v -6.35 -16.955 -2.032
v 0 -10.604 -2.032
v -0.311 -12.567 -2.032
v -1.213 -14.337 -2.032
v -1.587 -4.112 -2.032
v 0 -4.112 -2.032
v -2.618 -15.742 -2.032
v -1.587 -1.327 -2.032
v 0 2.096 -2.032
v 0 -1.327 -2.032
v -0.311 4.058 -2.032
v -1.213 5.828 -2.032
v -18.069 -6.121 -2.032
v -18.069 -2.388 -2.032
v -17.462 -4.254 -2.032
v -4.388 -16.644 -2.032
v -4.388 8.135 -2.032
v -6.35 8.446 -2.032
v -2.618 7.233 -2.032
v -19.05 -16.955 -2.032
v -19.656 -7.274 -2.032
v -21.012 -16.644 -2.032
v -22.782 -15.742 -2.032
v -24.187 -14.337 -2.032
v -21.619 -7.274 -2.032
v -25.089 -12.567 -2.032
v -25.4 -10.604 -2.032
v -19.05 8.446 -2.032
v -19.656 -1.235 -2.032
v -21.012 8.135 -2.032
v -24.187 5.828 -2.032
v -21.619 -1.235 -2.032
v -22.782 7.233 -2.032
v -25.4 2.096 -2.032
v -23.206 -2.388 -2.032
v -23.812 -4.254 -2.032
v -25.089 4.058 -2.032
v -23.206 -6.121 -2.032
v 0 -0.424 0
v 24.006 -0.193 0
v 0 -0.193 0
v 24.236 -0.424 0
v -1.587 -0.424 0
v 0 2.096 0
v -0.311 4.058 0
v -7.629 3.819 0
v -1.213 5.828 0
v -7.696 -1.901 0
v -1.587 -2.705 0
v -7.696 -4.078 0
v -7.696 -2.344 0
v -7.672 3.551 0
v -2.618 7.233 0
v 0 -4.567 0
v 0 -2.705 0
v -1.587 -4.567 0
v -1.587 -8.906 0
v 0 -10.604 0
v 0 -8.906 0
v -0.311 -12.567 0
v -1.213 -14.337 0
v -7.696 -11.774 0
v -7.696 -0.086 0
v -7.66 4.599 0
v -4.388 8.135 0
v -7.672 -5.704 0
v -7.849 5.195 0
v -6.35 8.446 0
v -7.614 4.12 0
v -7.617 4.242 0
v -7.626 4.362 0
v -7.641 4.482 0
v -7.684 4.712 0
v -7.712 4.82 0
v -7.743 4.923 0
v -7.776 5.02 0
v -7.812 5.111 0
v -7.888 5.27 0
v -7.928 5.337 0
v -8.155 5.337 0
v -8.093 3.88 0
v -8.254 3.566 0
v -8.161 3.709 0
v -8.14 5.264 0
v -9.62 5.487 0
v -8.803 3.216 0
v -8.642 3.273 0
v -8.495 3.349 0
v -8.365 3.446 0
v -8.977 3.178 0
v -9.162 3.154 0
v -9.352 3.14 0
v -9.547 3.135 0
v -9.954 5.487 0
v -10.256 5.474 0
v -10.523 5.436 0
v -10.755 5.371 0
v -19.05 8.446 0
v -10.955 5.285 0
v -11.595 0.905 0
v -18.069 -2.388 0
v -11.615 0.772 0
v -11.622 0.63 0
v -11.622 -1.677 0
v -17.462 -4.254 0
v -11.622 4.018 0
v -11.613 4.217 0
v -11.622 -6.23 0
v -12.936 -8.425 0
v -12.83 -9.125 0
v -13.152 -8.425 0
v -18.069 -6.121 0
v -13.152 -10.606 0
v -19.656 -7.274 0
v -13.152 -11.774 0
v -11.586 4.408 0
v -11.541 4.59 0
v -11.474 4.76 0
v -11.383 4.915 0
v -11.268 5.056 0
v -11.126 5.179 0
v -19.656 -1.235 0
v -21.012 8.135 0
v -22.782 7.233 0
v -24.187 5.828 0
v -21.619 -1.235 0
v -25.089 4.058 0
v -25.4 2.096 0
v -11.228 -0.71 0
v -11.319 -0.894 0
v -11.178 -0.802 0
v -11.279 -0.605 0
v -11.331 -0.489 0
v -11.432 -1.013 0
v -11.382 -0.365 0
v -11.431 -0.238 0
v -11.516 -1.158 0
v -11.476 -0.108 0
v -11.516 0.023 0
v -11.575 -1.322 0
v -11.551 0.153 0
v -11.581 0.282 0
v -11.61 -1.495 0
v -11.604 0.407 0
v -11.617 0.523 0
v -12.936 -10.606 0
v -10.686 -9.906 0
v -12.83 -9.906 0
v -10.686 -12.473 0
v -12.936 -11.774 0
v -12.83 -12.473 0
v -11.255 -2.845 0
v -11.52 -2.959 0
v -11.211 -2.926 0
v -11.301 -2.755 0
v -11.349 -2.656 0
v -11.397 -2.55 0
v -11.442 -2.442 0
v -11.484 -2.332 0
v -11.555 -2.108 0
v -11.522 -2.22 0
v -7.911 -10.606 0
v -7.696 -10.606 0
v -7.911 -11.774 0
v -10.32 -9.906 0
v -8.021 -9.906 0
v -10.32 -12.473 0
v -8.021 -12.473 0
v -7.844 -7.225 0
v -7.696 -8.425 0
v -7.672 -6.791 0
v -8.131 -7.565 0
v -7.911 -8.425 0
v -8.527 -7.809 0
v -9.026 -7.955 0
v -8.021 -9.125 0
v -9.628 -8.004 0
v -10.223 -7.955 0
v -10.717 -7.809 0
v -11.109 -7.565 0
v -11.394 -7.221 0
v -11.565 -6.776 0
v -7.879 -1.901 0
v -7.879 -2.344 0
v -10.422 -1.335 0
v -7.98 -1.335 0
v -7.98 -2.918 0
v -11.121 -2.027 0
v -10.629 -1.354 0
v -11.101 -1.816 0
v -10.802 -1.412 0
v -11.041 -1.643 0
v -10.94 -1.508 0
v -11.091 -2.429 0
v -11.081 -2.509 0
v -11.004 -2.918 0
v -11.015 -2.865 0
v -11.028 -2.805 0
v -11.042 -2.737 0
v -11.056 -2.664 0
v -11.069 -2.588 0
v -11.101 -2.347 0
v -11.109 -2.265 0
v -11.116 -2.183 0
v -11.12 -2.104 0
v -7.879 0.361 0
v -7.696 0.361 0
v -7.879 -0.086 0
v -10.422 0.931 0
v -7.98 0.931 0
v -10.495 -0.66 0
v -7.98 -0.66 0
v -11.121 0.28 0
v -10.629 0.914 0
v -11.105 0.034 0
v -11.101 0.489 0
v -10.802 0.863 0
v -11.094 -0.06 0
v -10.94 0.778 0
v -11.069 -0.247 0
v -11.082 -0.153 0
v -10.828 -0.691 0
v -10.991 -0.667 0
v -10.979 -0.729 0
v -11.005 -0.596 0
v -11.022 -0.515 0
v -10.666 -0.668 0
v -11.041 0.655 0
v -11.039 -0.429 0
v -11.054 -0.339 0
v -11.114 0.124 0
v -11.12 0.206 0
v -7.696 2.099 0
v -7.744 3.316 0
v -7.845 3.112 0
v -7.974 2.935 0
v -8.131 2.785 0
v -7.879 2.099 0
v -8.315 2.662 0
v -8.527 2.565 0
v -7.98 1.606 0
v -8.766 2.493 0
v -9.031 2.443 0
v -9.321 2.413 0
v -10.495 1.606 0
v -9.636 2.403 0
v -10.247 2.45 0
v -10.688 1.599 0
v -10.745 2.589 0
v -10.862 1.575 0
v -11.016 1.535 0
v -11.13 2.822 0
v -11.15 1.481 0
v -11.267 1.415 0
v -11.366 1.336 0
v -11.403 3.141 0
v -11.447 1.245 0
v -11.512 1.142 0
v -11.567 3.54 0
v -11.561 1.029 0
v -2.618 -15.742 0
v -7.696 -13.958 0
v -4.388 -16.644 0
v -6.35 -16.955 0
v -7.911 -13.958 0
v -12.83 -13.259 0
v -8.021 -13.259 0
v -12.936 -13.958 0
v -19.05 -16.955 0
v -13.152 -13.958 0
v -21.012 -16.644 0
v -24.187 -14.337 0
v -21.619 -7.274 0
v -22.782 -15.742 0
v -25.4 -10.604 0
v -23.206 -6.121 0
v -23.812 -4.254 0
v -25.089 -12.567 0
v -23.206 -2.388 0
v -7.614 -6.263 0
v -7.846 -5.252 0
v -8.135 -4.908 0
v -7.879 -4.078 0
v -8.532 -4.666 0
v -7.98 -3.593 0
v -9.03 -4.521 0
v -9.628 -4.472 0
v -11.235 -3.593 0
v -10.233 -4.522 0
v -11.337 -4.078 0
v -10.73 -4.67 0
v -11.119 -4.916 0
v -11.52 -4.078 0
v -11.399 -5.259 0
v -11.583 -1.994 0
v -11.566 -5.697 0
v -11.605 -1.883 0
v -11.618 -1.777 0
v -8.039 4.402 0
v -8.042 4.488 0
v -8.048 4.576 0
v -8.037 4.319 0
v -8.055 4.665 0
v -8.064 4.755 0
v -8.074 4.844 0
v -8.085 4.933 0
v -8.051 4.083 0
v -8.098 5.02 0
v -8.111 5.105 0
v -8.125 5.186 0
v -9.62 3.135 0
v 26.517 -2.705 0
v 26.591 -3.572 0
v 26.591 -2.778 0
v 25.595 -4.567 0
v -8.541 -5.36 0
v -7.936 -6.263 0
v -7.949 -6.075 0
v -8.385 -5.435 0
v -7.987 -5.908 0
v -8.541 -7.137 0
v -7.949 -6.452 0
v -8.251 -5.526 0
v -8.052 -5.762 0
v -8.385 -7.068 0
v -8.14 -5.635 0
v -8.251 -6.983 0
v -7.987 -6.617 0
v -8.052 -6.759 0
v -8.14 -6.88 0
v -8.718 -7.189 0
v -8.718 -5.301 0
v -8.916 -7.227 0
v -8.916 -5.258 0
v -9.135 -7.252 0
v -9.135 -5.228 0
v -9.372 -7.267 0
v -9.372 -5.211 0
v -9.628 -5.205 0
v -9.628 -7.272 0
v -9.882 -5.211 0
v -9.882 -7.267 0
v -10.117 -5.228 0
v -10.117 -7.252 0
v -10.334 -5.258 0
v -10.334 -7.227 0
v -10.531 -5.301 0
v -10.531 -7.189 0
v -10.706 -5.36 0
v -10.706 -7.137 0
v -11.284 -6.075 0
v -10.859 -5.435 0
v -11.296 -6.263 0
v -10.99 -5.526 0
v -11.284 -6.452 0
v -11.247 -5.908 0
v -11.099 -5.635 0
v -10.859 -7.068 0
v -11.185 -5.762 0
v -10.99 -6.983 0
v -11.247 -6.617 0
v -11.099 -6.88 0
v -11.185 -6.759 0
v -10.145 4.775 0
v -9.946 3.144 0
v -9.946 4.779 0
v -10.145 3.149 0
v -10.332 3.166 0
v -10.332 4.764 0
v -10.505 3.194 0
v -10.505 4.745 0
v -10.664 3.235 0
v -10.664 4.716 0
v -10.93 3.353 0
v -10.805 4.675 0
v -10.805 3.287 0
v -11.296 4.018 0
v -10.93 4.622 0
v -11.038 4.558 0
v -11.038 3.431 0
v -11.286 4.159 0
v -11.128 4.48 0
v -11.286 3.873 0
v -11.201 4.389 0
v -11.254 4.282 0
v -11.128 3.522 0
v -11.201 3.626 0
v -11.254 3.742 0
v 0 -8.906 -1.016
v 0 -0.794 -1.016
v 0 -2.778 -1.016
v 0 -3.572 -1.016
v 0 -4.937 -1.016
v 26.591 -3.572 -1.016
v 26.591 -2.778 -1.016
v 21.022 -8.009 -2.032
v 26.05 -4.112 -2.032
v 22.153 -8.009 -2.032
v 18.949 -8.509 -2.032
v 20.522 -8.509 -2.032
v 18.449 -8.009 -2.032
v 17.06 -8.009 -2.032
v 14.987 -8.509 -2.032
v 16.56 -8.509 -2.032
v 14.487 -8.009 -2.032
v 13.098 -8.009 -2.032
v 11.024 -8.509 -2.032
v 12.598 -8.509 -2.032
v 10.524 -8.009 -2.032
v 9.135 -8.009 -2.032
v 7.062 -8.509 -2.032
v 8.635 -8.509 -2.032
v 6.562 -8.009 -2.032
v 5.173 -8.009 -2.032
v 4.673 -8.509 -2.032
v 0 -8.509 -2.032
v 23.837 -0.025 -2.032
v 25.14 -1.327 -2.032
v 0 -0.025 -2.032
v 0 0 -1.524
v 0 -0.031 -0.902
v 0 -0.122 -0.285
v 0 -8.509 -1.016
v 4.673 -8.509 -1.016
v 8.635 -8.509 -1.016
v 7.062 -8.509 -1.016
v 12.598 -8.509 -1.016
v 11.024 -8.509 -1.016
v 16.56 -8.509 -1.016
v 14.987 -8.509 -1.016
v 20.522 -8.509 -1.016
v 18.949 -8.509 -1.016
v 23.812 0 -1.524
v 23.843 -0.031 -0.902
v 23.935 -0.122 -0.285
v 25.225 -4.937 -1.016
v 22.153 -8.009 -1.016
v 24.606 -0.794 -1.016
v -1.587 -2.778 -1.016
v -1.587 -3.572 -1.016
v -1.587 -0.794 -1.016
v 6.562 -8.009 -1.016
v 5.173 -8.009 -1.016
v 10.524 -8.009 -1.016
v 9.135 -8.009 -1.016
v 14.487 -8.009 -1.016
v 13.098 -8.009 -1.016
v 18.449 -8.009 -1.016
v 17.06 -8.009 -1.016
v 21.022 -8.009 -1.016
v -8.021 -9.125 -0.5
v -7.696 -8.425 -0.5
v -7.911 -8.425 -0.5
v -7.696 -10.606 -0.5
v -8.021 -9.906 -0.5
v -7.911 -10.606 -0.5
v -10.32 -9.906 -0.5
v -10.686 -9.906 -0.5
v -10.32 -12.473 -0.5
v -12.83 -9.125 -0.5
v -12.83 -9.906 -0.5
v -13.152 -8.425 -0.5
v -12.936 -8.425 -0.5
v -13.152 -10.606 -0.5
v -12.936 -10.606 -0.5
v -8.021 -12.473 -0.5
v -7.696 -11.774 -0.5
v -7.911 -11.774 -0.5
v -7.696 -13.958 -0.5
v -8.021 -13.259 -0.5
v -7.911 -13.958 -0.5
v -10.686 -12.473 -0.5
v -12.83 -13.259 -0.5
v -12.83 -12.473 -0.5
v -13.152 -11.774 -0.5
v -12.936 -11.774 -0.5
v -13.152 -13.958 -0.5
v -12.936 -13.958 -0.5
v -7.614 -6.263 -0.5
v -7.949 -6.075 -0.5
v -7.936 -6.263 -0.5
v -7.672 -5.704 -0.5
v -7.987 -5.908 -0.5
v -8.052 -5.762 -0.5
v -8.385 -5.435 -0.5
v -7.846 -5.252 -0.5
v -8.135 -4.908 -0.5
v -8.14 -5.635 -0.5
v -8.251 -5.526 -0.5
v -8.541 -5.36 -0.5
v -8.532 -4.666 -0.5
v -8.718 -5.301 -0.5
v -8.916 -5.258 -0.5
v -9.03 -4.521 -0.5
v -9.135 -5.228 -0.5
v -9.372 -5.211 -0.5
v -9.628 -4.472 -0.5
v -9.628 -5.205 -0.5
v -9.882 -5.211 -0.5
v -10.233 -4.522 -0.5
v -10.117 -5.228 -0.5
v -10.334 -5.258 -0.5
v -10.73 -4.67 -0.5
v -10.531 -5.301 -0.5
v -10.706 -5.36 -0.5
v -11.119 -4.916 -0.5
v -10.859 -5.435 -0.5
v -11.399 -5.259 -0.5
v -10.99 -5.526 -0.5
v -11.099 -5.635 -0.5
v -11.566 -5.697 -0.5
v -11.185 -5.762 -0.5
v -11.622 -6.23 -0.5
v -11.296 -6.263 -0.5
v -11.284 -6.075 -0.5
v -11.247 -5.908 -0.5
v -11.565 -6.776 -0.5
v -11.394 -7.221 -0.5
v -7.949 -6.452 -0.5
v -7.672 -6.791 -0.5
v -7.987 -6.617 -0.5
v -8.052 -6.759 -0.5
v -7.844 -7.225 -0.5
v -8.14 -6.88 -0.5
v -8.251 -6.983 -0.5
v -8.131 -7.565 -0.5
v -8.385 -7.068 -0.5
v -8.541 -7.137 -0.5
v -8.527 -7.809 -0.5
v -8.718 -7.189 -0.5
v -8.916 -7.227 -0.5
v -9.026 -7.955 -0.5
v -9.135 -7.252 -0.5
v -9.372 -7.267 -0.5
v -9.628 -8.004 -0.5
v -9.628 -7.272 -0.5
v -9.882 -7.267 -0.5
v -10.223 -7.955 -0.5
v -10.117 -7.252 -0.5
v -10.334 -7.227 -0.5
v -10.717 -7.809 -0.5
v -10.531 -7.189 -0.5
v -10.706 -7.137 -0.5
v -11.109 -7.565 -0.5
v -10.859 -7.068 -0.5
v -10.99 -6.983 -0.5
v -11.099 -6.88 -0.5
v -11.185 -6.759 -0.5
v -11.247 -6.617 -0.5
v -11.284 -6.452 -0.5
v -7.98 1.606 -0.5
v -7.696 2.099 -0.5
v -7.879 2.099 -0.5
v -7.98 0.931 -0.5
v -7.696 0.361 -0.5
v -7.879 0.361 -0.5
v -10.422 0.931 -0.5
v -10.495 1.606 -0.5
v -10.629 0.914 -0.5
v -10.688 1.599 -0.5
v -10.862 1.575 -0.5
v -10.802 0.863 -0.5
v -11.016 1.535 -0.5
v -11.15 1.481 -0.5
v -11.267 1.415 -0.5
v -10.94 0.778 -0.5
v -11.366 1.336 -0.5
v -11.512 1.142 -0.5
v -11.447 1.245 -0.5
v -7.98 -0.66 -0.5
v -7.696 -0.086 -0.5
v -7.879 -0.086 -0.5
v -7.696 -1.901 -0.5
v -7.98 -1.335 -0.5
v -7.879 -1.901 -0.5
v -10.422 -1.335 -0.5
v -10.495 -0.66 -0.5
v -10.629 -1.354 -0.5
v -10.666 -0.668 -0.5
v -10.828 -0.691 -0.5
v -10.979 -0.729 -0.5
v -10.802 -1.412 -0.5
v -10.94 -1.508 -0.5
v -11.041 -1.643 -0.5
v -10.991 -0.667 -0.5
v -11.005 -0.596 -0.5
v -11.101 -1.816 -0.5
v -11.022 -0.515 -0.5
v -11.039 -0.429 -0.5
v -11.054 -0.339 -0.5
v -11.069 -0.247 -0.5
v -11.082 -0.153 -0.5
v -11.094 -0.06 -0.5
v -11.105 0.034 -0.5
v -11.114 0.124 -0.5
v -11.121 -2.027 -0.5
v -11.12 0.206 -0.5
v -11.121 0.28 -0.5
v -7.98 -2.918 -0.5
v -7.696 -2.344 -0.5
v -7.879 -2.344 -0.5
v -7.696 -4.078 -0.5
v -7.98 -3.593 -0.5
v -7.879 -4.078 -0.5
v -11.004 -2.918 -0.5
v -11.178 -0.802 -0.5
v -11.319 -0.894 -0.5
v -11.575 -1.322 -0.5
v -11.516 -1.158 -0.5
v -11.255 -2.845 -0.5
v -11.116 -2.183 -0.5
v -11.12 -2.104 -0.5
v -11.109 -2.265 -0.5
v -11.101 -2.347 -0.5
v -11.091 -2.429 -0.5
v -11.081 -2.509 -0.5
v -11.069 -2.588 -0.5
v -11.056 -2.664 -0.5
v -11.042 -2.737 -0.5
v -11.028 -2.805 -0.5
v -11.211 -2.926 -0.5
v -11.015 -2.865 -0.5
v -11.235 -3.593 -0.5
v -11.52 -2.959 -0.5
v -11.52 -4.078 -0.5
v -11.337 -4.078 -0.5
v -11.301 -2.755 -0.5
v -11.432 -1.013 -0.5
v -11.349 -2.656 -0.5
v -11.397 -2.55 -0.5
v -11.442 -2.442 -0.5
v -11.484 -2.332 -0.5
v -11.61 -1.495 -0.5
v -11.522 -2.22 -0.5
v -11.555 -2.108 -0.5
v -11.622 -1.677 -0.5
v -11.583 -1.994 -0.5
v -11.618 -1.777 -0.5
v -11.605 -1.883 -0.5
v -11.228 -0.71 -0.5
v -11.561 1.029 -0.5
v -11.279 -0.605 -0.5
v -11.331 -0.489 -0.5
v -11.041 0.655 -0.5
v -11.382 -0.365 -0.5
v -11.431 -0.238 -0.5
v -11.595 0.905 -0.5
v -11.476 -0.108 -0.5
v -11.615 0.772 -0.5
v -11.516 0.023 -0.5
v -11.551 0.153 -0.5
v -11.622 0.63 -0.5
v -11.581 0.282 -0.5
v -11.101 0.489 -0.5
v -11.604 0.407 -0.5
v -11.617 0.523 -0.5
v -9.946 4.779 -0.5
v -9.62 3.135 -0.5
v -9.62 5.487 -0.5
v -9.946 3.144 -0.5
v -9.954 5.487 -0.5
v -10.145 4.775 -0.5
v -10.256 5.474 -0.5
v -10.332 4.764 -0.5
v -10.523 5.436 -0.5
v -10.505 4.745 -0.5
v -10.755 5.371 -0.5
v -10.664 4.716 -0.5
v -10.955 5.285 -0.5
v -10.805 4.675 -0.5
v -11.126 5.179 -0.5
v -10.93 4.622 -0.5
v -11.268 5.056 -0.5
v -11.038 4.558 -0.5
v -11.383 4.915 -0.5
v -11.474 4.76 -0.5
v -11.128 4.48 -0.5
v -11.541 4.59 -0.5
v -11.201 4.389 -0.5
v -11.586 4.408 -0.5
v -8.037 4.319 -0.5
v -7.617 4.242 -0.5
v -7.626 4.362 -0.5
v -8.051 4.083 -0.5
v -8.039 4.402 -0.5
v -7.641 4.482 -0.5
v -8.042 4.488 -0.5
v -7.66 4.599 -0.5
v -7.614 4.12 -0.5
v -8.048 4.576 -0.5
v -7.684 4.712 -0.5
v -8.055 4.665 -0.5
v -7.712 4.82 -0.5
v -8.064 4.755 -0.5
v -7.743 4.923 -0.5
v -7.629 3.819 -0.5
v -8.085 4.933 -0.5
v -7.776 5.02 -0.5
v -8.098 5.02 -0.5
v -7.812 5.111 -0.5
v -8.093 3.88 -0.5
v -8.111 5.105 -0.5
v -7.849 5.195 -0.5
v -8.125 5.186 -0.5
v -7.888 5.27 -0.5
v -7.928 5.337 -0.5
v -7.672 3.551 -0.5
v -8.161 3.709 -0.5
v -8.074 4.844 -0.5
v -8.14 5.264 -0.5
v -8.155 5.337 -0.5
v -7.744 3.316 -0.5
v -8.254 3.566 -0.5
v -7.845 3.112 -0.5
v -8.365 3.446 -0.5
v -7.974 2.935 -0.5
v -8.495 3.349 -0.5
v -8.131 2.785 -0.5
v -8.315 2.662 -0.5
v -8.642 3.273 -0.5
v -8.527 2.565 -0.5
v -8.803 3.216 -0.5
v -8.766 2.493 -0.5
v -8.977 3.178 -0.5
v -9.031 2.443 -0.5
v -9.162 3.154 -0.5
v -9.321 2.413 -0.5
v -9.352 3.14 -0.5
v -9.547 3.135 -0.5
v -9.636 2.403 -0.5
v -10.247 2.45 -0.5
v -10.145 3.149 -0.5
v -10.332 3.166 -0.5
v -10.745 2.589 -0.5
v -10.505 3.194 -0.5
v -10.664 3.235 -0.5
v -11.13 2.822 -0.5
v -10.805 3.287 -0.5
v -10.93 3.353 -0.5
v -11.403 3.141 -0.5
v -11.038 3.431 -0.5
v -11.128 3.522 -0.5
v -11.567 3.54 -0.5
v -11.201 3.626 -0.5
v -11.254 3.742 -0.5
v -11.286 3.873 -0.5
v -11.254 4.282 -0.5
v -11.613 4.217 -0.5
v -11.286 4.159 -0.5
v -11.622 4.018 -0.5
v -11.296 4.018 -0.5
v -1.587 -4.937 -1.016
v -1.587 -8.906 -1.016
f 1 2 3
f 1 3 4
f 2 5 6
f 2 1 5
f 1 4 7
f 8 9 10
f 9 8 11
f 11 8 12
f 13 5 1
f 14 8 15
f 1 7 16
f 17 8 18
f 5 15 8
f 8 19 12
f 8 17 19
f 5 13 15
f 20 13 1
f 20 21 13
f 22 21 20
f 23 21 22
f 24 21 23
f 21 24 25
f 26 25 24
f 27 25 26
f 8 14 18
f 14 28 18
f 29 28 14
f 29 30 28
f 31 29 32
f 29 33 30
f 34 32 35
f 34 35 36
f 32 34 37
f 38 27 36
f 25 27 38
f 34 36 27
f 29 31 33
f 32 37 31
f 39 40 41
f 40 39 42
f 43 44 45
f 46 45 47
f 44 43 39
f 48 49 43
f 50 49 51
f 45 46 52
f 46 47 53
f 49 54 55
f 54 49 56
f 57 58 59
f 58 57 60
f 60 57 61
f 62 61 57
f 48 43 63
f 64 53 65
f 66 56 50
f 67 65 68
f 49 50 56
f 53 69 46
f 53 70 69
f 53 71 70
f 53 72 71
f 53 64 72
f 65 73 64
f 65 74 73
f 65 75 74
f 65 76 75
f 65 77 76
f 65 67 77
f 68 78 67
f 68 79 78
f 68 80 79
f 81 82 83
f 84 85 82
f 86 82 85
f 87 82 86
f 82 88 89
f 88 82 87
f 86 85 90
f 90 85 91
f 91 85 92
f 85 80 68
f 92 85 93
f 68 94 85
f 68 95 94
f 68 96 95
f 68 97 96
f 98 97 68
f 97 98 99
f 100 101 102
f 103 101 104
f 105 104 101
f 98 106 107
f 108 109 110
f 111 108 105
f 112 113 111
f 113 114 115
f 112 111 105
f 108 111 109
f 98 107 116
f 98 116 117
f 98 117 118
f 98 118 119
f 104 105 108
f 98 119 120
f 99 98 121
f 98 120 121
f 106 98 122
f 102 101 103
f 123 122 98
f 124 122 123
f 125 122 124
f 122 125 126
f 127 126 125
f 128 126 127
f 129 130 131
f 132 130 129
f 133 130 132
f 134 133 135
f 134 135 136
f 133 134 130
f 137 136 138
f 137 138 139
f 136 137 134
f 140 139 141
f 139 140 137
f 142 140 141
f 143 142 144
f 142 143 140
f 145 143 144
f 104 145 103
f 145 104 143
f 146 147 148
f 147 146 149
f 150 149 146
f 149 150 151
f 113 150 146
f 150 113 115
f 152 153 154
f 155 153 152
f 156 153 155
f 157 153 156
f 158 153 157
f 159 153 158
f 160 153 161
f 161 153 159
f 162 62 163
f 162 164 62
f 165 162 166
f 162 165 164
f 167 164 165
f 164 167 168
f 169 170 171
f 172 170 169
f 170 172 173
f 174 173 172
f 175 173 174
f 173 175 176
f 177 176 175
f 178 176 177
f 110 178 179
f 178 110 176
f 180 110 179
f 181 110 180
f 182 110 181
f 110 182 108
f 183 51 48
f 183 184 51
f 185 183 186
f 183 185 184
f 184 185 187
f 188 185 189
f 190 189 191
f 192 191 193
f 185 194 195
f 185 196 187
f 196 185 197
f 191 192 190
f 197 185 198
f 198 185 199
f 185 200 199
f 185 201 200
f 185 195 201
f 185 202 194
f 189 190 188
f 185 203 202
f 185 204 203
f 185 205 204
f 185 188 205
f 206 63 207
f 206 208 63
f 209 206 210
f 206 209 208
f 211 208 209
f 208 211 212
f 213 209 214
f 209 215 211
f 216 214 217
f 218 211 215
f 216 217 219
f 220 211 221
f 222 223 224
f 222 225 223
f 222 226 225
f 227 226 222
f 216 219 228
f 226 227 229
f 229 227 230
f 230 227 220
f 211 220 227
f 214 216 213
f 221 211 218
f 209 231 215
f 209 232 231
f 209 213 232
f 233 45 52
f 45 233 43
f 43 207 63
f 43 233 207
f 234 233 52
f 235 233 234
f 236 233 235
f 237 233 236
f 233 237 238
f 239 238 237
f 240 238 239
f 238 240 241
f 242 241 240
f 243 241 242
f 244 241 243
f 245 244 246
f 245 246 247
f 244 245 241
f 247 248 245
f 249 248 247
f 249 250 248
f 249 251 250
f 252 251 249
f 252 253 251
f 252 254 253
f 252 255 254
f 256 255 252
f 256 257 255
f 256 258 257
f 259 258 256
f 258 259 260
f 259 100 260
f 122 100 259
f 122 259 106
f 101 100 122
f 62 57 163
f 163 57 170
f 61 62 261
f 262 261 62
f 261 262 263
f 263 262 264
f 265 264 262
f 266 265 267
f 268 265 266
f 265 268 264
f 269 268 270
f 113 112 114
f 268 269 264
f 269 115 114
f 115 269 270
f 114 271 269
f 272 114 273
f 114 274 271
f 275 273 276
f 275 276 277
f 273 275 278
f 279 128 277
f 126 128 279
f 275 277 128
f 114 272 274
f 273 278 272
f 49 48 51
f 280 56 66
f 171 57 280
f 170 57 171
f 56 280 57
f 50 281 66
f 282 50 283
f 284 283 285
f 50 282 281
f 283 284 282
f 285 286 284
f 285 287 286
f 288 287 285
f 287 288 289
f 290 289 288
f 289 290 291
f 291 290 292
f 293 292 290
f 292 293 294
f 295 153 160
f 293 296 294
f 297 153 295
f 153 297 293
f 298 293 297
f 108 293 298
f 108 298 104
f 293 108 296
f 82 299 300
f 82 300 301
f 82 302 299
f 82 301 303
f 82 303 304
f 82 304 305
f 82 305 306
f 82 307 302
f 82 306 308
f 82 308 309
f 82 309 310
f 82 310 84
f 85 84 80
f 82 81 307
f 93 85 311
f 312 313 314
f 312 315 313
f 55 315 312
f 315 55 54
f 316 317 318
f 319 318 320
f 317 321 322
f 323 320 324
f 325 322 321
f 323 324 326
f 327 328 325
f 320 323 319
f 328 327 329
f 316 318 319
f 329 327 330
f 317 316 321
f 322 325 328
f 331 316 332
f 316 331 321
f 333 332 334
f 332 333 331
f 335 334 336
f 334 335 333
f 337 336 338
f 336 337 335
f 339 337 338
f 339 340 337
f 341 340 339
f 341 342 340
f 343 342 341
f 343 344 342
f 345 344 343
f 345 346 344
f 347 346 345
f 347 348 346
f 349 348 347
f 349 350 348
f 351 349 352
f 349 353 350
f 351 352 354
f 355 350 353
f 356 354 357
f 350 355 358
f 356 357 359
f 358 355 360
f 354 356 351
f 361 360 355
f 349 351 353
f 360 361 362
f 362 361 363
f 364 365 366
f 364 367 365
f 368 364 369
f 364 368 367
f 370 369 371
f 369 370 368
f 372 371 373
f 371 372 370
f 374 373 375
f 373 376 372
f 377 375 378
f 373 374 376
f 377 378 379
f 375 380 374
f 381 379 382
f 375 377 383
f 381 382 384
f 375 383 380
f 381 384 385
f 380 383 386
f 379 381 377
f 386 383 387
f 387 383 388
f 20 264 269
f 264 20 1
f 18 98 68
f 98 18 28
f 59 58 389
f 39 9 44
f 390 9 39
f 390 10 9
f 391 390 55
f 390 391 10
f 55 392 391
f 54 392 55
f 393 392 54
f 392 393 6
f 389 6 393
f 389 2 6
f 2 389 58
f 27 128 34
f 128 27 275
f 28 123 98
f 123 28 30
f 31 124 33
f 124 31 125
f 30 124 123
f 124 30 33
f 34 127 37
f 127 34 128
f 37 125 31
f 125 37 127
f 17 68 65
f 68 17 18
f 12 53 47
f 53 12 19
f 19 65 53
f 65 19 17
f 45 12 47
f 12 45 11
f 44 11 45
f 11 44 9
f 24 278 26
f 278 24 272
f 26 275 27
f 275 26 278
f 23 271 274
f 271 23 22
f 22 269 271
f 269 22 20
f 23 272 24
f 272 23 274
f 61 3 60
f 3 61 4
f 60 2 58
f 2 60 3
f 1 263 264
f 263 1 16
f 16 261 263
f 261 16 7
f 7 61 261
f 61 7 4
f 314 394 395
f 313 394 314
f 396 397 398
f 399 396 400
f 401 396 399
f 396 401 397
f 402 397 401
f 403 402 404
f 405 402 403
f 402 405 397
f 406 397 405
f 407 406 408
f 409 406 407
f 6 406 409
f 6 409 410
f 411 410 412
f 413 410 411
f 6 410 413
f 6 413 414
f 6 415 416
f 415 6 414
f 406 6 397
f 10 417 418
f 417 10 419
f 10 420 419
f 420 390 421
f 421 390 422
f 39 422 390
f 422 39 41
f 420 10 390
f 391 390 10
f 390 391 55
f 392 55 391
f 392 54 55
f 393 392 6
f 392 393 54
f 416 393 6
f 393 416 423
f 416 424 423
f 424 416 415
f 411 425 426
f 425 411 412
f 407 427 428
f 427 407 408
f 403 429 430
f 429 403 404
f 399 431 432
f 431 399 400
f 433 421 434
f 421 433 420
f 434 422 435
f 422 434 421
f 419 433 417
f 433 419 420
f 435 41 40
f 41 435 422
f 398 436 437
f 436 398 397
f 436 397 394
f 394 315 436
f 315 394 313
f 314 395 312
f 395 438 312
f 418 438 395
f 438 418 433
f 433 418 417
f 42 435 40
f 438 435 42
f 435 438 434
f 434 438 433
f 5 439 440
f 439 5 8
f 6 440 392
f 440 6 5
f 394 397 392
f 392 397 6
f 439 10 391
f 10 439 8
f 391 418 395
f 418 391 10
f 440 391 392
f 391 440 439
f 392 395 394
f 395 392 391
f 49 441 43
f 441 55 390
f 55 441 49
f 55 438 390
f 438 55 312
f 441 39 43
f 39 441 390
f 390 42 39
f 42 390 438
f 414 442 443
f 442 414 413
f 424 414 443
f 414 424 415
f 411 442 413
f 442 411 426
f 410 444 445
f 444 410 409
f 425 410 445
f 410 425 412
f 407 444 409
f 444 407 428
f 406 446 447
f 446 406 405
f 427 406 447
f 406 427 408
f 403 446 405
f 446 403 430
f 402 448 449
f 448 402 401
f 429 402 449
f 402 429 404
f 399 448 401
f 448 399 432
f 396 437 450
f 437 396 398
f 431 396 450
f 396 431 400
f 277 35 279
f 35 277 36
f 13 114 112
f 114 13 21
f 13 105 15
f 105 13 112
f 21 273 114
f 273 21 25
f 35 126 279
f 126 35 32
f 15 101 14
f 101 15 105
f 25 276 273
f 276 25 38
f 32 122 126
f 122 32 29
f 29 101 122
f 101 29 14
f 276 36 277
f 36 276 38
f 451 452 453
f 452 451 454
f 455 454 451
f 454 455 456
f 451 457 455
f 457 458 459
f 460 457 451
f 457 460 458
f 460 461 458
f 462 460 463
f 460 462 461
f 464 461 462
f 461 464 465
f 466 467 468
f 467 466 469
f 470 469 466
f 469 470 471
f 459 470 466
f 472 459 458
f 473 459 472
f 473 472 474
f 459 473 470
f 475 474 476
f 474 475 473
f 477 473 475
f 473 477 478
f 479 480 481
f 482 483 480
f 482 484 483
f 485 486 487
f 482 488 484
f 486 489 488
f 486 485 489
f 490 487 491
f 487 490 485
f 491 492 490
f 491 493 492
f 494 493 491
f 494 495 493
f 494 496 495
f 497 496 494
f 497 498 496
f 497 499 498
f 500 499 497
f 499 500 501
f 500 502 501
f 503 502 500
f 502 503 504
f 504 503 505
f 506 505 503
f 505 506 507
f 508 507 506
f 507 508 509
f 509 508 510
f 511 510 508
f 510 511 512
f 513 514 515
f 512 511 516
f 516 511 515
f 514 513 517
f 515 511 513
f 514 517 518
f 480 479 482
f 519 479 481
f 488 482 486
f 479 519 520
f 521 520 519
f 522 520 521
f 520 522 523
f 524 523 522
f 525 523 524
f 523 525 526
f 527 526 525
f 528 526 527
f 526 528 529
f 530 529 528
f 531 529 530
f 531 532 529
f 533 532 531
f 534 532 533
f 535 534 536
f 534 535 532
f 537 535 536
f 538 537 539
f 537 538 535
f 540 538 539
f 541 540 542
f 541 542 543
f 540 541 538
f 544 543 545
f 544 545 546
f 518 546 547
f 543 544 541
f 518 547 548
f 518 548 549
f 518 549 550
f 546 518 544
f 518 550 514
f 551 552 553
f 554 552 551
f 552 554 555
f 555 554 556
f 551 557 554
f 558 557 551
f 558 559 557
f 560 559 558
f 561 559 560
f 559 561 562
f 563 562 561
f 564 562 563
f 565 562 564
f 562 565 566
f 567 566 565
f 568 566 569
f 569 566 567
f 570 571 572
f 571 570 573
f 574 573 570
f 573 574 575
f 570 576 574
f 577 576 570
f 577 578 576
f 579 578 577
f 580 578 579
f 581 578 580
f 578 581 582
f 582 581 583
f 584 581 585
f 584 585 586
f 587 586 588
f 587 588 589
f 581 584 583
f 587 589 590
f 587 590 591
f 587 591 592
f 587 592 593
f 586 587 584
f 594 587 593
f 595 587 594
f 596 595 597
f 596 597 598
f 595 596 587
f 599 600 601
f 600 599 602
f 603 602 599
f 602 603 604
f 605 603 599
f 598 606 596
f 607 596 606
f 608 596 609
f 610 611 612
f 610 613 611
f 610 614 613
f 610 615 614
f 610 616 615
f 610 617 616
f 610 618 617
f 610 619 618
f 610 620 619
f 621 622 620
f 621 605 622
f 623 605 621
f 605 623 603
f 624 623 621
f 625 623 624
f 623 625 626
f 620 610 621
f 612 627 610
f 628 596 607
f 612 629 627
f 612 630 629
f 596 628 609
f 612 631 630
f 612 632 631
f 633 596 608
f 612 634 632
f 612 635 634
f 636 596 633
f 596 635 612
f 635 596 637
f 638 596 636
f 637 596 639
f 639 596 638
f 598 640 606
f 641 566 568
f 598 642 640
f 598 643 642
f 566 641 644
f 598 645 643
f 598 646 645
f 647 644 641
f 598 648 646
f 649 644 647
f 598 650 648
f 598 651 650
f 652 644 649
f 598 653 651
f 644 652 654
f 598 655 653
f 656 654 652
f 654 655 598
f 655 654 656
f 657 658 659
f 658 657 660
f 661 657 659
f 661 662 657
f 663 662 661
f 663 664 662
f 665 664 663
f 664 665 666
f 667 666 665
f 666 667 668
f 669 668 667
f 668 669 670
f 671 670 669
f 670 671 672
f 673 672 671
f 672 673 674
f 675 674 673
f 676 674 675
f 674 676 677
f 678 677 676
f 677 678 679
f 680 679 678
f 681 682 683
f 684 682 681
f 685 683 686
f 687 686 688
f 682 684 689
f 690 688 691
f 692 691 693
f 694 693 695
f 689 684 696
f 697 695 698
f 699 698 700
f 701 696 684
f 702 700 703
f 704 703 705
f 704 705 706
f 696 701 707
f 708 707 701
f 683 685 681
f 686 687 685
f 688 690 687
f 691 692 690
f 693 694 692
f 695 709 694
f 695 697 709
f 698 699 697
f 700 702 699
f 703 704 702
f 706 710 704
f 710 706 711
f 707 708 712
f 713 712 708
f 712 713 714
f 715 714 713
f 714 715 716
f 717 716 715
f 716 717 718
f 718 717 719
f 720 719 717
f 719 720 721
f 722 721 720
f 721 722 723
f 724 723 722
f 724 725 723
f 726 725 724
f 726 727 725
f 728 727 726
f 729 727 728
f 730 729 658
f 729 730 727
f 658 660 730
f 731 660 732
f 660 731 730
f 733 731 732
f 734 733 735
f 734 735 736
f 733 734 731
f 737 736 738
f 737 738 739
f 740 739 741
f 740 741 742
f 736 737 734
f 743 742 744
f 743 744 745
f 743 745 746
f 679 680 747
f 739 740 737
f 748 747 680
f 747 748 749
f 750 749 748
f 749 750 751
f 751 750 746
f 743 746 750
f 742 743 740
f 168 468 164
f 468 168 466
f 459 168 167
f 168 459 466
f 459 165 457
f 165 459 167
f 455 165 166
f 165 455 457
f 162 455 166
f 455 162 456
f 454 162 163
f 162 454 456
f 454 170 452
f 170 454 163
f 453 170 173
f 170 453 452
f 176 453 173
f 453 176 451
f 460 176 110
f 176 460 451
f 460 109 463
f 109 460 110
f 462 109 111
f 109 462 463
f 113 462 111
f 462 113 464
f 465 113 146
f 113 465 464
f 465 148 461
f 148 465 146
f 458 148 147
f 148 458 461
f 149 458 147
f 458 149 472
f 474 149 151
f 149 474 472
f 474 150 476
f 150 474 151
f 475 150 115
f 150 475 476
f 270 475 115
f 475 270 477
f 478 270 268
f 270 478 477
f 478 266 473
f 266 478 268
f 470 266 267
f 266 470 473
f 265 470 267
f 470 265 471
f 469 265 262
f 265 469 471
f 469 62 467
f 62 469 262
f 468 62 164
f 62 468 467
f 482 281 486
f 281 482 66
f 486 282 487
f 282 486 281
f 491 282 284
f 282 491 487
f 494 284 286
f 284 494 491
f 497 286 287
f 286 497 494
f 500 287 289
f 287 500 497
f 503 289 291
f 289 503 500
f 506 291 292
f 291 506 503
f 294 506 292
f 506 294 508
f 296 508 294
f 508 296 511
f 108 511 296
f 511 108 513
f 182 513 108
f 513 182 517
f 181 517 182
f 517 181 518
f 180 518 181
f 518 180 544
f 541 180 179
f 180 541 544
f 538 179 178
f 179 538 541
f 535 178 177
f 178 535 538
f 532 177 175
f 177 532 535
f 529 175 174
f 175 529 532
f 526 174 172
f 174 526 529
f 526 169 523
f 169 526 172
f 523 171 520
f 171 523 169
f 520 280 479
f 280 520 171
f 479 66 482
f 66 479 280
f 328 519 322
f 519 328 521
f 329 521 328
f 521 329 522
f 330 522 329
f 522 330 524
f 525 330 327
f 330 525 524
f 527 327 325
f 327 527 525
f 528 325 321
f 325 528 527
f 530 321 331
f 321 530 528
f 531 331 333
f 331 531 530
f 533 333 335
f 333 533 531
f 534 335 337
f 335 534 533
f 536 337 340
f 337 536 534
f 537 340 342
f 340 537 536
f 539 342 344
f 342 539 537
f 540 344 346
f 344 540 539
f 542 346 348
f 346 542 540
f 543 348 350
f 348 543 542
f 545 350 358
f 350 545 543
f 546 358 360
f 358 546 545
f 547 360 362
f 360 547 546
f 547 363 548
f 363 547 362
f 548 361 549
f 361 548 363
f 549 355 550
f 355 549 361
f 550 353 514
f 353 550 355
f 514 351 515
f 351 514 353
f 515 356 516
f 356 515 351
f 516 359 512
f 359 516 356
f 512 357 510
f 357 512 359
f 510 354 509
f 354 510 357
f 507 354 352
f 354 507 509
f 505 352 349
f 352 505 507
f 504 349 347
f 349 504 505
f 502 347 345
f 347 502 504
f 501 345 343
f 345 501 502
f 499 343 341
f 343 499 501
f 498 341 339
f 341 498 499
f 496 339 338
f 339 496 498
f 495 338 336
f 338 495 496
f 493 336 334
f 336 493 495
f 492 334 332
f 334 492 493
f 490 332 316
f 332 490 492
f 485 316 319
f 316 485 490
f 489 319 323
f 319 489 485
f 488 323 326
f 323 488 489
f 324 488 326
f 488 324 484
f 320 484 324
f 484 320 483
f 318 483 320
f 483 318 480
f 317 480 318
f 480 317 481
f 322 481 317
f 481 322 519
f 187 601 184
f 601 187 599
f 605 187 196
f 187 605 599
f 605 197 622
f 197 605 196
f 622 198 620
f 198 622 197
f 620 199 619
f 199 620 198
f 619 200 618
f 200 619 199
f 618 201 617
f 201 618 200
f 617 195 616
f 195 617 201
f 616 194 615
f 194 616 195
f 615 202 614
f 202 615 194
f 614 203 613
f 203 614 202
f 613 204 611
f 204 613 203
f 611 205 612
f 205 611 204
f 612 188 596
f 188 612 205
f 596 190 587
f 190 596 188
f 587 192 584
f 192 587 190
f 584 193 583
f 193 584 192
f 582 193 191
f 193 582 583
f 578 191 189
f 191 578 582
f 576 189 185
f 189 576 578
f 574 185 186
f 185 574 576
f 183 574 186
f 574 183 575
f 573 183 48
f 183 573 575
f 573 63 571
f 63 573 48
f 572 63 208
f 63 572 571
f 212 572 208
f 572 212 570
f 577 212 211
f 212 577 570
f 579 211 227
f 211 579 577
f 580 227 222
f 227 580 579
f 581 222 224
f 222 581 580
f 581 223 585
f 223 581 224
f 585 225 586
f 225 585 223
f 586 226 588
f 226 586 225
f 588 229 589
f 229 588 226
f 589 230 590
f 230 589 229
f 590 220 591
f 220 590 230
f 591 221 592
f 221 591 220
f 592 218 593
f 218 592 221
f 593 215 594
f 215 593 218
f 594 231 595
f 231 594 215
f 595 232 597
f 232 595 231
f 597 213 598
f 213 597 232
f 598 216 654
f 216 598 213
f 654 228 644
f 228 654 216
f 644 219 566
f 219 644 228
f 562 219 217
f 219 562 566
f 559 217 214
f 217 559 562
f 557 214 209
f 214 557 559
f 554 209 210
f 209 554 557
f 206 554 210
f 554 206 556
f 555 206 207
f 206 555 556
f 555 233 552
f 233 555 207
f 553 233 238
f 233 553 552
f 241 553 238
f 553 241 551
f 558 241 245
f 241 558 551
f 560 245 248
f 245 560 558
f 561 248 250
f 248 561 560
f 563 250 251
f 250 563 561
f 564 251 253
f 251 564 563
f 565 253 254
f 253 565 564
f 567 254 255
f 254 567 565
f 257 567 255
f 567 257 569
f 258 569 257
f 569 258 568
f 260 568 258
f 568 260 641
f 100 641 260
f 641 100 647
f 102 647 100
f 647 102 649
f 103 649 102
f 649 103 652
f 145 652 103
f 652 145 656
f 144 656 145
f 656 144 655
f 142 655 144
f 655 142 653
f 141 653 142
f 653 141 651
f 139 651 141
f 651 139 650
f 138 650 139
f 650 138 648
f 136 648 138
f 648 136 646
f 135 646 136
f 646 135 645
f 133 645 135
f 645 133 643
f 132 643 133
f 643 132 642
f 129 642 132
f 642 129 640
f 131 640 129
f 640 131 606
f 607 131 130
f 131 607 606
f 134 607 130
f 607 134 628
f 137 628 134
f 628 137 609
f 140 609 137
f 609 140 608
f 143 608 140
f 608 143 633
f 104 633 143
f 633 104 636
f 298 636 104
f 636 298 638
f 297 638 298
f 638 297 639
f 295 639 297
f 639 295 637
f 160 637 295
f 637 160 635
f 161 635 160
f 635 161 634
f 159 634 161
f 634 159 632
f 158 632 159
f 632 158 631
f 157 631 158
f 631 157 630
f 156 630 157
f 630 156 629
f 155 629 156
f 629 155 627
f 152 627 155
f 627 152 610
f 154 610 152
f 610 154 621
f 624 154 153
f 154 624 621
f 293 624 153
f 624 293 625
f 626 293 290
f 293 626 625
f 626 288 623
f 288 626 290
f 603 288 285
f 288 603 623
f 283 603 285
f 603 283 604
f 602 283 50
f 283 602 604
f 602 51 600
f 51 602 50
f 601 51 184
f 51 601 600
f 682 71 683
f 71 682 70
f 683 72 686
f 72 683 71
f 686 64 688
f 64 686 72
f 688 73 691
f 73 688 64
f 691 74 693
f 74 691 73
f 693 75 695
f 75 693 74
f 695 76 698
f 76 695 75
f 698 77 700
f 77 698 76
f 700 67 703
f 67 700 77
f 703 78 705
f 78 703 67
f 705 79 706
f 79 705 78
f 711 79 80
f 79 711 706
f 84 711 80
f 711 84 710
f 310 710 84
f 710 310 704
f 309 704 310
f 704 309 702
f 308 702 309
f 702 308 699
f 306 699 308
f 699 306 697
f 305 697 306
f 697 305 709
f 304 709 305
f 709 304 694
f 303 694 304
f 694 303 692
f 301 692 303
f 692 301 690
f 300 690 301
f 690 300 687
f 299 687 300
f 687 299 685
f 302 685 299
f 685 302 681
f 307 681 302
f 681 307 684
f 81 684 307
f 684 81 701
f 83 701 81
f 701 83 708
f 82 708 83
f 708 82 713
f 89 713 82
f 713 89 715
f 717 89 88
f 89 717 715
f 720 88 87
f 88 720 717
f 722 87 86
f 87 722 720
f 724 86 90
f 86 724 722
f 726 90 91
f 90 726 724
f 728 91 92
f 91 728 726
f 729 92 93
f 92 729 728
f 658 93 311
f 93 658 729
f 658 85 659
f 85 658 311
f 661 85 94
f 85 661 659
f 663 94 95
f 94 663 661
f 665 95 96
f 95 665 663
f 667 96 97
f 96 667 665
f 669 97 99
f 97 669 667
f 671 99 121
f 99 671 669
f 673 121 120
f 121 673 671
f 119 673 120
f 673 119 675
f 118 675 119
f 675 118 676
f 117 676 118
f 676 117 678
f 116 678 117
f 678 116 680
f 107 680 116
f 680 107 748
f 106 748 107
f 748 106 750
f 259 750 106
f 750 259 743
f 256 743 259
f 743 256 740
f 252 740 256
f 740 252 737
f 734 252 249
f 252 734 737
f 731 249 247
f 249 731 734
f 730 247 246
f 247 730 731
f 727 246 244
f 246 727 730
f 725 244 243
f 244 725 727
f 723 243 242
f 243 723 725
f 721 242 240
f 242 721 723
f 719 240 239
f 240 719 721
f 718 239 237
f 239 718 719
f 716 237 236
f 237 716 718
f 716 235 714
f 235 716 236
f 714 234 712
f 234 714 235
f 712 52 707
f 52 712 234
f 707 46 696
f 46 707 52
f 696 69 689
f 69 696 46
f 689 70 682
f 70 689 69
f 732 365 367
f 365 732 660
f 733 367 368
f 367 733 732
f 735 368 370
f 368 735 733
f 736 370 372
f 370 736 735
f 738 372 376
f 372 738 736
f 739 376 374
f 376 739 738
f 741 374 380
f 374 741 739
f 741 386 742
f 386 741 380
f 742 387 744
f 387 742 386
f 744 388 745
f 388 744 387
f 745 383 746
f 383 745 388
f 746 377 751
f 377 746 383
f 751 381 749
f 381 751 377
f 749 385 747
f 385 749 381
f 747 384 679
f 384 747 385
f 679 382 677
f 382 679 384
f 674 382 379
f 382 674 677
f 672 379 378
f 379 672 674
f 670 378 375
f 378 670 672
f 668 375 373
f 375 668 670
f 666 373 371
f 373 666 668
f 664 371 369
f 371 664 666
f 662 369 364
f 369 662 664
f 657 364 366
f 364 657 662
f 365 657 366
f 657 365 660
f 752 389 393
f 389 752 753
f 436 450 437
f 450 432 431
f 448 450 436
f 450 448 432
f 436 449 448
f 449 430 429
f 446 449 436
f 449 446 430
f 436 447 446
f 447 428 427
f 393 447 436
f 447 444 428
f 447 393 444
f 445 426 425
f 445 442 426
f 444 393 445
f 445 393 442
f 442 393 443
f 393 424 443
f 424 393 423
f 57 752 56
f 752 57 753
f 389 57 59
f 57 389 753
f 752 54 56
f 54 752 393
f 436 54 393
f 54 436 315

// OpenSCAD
// Schlage SC1 5 pin with label - by Chris Myers
// Based on Physical Keygen - by Nirav Patel <http://eclecti.cc>
//
// Generate a duplicate of a Schlage SC1 key by editing the last line of the file
// and entering in the key code of the lock.  If you don't know the key code,
// you can measure the key and compare the numbers at:
// http://web.archive.org/web/20050217020917fw_/http://dlaco.com/spacing/tips.htm
//
// This work is licensed under a Creative Commons Attribution 3.0 Unported License.

//1st number of key code (Handle)
a = 0;
//2nd number of key code
b = 0;
//3rd number of key code
c = 0;
//4th number of key code
d = 0;
//5th number of key code (Tip)
e = 0;
function mm(i) = i*25.4;

/* [Label] */
// will be embossed into the key
label = "Home";
//depth of the lettering
textDepth = 1;
// size of the font
textSize = 6;
// font to use
textFont = "Times"; // [Arial,Times,Helvetica,Courier,Futura]

module rounded(size, r) {
    union() {
        translate([r, 0, 0]) cube([size[0]-2*r, size[1], size[2]]);
        translate([0, r, 0]) cube([size[0], size[1]-2*r, size[2]]);
        translate([r, r, 0]) cylinder(h=size[2], r=r);
        translate([size[0]-r, r, 0]) cylinder(h=size[2], r=r);
        translate([r, size[1]-r, 0]) cylinder(h=size[2], r=r);
        translate([size[0]-r, size[1]-r, 0]) cylinder(h=size[2], r=r);
    }
}

module bit() {
    w = mm(1/4);
    difference() {
        translate([-w/2, 0, 0]) cube([w, mm(1), w]);
        translate([-mm(7/256), 0, 0]) rotate([0, 0, 135]) cube([w, w, w]);
         translate([mm(7/256), 0, 0]) rotate([0, 0, -45]) cube([w, w, w]);
    }
}

// Schlage SC1 5 pin key.  The measurements are mostly guesses based on reverse
// engineering some keys I have and some publicly available information.
module sc1(bits) {
    // You may need to adjust these to fit your specific printer settings
    thickness = mm(0.080);
    length = mm(17/16);
    width = mm(.335);
    
    shoulder = mm(.231);
    pin_spacing = mm(.156);
    depth_inc = mm(.015);
    
    // A fudge factor.  Printing with your average RepRap, the bottom layer is
    // going to be squeezed larger than you want. You can make the pins
    // go slighly deeper by a fudge amount to make up for it if you aren't
    // adjusting for it elsewhere like Skeinforge or in your firmware.
    // 0.5mm works well for me.
    fudge = 0.5;
    
    // Handle size
    h_l = mm(1);
    h_w = mm(1);
    h_d = mm(1/16);
    difference() {
        // blade and key handle
        union() {
            translate([-h_l, -h_w/2 + width/2, 0]) rounded([h_l, h_w, thickness], mm(1/4));
            intersection() {
                // cut a little off the tip to avoid going too long
                cube([length - mm(1/64), width, thickness]);
                translate([0, mm(1/4), thickness*3/4]) rotate([0, 90, 0]) cylinder(h=length, r=mm(1/4), $fn=64);
            }
        }
        
        // chamfer the tip
        translate([length, mm(1/8), 0]) {
            rotate([0, 0, 45]) cube([10, 10, thickness]);
            rotate([0, 0, 225]) cube([10, 10, thickness]);
        }
        
        // put in a hole for keychain use
        translate([-h_l + mm(3/16), width/2, 0]) cylinder(h=thickness, r=mm(1/8));
        
        // write text on Key
        translate([-h_l / 2 + mm(3/16)/2, width/2, 1-fudge])
        rotate([180,0,-90])
        linear_extrude(height = textDepth)
        text(label, size = textSize, font = textFont, valign="center", halign="center");

        // cut the channels in the key.  designed more for printability than accuracy
        union() {
            translate([-h_d, mm(9/64), thickness/2]) rotate([62, 0, 0]) cube([length + h_d, width, width]);
            translate([-h_d, mm(7/64), thickness/2]) rotate([55, 0, 0]) cube([length + h_d, width, width]);
            translate([-h_d, mm(7/64), thickness/2]) cube([length + h_d, mm(1/32), width]);
        }
        
        translate([-h_d, width - mm(9/64), 0]) cube([length + h_d, width - (width - mm(10/64)), thickness/2]);
        translate([-h_d, width - mm(9/64), thickness/2]) rotate([-110, 0, 0]) cube([length + h_d, width, thickness/2]);
        
        intersection() {
            translate([-h_d, mm(1/32), thickness/2]) rotate([-118, 0, 0]) cube([length + h_d, width, width]);
            translate([-h_d, mm(1/32), thickness/2]) rotate([-110, 0, 0]) cube([length + h_d, width, width]);
        }
        
        // Do the actual bitting
        for (b = [0:4]) {
            translate([shoulder + b*pin_spacing, width - bits[b]*depth_inc - fudge, 0]) bit();
        }
    }
}

// Flip the key over for easy printing

rotate([180, 0, 0]) sc1([a,b,c,d,e]);
